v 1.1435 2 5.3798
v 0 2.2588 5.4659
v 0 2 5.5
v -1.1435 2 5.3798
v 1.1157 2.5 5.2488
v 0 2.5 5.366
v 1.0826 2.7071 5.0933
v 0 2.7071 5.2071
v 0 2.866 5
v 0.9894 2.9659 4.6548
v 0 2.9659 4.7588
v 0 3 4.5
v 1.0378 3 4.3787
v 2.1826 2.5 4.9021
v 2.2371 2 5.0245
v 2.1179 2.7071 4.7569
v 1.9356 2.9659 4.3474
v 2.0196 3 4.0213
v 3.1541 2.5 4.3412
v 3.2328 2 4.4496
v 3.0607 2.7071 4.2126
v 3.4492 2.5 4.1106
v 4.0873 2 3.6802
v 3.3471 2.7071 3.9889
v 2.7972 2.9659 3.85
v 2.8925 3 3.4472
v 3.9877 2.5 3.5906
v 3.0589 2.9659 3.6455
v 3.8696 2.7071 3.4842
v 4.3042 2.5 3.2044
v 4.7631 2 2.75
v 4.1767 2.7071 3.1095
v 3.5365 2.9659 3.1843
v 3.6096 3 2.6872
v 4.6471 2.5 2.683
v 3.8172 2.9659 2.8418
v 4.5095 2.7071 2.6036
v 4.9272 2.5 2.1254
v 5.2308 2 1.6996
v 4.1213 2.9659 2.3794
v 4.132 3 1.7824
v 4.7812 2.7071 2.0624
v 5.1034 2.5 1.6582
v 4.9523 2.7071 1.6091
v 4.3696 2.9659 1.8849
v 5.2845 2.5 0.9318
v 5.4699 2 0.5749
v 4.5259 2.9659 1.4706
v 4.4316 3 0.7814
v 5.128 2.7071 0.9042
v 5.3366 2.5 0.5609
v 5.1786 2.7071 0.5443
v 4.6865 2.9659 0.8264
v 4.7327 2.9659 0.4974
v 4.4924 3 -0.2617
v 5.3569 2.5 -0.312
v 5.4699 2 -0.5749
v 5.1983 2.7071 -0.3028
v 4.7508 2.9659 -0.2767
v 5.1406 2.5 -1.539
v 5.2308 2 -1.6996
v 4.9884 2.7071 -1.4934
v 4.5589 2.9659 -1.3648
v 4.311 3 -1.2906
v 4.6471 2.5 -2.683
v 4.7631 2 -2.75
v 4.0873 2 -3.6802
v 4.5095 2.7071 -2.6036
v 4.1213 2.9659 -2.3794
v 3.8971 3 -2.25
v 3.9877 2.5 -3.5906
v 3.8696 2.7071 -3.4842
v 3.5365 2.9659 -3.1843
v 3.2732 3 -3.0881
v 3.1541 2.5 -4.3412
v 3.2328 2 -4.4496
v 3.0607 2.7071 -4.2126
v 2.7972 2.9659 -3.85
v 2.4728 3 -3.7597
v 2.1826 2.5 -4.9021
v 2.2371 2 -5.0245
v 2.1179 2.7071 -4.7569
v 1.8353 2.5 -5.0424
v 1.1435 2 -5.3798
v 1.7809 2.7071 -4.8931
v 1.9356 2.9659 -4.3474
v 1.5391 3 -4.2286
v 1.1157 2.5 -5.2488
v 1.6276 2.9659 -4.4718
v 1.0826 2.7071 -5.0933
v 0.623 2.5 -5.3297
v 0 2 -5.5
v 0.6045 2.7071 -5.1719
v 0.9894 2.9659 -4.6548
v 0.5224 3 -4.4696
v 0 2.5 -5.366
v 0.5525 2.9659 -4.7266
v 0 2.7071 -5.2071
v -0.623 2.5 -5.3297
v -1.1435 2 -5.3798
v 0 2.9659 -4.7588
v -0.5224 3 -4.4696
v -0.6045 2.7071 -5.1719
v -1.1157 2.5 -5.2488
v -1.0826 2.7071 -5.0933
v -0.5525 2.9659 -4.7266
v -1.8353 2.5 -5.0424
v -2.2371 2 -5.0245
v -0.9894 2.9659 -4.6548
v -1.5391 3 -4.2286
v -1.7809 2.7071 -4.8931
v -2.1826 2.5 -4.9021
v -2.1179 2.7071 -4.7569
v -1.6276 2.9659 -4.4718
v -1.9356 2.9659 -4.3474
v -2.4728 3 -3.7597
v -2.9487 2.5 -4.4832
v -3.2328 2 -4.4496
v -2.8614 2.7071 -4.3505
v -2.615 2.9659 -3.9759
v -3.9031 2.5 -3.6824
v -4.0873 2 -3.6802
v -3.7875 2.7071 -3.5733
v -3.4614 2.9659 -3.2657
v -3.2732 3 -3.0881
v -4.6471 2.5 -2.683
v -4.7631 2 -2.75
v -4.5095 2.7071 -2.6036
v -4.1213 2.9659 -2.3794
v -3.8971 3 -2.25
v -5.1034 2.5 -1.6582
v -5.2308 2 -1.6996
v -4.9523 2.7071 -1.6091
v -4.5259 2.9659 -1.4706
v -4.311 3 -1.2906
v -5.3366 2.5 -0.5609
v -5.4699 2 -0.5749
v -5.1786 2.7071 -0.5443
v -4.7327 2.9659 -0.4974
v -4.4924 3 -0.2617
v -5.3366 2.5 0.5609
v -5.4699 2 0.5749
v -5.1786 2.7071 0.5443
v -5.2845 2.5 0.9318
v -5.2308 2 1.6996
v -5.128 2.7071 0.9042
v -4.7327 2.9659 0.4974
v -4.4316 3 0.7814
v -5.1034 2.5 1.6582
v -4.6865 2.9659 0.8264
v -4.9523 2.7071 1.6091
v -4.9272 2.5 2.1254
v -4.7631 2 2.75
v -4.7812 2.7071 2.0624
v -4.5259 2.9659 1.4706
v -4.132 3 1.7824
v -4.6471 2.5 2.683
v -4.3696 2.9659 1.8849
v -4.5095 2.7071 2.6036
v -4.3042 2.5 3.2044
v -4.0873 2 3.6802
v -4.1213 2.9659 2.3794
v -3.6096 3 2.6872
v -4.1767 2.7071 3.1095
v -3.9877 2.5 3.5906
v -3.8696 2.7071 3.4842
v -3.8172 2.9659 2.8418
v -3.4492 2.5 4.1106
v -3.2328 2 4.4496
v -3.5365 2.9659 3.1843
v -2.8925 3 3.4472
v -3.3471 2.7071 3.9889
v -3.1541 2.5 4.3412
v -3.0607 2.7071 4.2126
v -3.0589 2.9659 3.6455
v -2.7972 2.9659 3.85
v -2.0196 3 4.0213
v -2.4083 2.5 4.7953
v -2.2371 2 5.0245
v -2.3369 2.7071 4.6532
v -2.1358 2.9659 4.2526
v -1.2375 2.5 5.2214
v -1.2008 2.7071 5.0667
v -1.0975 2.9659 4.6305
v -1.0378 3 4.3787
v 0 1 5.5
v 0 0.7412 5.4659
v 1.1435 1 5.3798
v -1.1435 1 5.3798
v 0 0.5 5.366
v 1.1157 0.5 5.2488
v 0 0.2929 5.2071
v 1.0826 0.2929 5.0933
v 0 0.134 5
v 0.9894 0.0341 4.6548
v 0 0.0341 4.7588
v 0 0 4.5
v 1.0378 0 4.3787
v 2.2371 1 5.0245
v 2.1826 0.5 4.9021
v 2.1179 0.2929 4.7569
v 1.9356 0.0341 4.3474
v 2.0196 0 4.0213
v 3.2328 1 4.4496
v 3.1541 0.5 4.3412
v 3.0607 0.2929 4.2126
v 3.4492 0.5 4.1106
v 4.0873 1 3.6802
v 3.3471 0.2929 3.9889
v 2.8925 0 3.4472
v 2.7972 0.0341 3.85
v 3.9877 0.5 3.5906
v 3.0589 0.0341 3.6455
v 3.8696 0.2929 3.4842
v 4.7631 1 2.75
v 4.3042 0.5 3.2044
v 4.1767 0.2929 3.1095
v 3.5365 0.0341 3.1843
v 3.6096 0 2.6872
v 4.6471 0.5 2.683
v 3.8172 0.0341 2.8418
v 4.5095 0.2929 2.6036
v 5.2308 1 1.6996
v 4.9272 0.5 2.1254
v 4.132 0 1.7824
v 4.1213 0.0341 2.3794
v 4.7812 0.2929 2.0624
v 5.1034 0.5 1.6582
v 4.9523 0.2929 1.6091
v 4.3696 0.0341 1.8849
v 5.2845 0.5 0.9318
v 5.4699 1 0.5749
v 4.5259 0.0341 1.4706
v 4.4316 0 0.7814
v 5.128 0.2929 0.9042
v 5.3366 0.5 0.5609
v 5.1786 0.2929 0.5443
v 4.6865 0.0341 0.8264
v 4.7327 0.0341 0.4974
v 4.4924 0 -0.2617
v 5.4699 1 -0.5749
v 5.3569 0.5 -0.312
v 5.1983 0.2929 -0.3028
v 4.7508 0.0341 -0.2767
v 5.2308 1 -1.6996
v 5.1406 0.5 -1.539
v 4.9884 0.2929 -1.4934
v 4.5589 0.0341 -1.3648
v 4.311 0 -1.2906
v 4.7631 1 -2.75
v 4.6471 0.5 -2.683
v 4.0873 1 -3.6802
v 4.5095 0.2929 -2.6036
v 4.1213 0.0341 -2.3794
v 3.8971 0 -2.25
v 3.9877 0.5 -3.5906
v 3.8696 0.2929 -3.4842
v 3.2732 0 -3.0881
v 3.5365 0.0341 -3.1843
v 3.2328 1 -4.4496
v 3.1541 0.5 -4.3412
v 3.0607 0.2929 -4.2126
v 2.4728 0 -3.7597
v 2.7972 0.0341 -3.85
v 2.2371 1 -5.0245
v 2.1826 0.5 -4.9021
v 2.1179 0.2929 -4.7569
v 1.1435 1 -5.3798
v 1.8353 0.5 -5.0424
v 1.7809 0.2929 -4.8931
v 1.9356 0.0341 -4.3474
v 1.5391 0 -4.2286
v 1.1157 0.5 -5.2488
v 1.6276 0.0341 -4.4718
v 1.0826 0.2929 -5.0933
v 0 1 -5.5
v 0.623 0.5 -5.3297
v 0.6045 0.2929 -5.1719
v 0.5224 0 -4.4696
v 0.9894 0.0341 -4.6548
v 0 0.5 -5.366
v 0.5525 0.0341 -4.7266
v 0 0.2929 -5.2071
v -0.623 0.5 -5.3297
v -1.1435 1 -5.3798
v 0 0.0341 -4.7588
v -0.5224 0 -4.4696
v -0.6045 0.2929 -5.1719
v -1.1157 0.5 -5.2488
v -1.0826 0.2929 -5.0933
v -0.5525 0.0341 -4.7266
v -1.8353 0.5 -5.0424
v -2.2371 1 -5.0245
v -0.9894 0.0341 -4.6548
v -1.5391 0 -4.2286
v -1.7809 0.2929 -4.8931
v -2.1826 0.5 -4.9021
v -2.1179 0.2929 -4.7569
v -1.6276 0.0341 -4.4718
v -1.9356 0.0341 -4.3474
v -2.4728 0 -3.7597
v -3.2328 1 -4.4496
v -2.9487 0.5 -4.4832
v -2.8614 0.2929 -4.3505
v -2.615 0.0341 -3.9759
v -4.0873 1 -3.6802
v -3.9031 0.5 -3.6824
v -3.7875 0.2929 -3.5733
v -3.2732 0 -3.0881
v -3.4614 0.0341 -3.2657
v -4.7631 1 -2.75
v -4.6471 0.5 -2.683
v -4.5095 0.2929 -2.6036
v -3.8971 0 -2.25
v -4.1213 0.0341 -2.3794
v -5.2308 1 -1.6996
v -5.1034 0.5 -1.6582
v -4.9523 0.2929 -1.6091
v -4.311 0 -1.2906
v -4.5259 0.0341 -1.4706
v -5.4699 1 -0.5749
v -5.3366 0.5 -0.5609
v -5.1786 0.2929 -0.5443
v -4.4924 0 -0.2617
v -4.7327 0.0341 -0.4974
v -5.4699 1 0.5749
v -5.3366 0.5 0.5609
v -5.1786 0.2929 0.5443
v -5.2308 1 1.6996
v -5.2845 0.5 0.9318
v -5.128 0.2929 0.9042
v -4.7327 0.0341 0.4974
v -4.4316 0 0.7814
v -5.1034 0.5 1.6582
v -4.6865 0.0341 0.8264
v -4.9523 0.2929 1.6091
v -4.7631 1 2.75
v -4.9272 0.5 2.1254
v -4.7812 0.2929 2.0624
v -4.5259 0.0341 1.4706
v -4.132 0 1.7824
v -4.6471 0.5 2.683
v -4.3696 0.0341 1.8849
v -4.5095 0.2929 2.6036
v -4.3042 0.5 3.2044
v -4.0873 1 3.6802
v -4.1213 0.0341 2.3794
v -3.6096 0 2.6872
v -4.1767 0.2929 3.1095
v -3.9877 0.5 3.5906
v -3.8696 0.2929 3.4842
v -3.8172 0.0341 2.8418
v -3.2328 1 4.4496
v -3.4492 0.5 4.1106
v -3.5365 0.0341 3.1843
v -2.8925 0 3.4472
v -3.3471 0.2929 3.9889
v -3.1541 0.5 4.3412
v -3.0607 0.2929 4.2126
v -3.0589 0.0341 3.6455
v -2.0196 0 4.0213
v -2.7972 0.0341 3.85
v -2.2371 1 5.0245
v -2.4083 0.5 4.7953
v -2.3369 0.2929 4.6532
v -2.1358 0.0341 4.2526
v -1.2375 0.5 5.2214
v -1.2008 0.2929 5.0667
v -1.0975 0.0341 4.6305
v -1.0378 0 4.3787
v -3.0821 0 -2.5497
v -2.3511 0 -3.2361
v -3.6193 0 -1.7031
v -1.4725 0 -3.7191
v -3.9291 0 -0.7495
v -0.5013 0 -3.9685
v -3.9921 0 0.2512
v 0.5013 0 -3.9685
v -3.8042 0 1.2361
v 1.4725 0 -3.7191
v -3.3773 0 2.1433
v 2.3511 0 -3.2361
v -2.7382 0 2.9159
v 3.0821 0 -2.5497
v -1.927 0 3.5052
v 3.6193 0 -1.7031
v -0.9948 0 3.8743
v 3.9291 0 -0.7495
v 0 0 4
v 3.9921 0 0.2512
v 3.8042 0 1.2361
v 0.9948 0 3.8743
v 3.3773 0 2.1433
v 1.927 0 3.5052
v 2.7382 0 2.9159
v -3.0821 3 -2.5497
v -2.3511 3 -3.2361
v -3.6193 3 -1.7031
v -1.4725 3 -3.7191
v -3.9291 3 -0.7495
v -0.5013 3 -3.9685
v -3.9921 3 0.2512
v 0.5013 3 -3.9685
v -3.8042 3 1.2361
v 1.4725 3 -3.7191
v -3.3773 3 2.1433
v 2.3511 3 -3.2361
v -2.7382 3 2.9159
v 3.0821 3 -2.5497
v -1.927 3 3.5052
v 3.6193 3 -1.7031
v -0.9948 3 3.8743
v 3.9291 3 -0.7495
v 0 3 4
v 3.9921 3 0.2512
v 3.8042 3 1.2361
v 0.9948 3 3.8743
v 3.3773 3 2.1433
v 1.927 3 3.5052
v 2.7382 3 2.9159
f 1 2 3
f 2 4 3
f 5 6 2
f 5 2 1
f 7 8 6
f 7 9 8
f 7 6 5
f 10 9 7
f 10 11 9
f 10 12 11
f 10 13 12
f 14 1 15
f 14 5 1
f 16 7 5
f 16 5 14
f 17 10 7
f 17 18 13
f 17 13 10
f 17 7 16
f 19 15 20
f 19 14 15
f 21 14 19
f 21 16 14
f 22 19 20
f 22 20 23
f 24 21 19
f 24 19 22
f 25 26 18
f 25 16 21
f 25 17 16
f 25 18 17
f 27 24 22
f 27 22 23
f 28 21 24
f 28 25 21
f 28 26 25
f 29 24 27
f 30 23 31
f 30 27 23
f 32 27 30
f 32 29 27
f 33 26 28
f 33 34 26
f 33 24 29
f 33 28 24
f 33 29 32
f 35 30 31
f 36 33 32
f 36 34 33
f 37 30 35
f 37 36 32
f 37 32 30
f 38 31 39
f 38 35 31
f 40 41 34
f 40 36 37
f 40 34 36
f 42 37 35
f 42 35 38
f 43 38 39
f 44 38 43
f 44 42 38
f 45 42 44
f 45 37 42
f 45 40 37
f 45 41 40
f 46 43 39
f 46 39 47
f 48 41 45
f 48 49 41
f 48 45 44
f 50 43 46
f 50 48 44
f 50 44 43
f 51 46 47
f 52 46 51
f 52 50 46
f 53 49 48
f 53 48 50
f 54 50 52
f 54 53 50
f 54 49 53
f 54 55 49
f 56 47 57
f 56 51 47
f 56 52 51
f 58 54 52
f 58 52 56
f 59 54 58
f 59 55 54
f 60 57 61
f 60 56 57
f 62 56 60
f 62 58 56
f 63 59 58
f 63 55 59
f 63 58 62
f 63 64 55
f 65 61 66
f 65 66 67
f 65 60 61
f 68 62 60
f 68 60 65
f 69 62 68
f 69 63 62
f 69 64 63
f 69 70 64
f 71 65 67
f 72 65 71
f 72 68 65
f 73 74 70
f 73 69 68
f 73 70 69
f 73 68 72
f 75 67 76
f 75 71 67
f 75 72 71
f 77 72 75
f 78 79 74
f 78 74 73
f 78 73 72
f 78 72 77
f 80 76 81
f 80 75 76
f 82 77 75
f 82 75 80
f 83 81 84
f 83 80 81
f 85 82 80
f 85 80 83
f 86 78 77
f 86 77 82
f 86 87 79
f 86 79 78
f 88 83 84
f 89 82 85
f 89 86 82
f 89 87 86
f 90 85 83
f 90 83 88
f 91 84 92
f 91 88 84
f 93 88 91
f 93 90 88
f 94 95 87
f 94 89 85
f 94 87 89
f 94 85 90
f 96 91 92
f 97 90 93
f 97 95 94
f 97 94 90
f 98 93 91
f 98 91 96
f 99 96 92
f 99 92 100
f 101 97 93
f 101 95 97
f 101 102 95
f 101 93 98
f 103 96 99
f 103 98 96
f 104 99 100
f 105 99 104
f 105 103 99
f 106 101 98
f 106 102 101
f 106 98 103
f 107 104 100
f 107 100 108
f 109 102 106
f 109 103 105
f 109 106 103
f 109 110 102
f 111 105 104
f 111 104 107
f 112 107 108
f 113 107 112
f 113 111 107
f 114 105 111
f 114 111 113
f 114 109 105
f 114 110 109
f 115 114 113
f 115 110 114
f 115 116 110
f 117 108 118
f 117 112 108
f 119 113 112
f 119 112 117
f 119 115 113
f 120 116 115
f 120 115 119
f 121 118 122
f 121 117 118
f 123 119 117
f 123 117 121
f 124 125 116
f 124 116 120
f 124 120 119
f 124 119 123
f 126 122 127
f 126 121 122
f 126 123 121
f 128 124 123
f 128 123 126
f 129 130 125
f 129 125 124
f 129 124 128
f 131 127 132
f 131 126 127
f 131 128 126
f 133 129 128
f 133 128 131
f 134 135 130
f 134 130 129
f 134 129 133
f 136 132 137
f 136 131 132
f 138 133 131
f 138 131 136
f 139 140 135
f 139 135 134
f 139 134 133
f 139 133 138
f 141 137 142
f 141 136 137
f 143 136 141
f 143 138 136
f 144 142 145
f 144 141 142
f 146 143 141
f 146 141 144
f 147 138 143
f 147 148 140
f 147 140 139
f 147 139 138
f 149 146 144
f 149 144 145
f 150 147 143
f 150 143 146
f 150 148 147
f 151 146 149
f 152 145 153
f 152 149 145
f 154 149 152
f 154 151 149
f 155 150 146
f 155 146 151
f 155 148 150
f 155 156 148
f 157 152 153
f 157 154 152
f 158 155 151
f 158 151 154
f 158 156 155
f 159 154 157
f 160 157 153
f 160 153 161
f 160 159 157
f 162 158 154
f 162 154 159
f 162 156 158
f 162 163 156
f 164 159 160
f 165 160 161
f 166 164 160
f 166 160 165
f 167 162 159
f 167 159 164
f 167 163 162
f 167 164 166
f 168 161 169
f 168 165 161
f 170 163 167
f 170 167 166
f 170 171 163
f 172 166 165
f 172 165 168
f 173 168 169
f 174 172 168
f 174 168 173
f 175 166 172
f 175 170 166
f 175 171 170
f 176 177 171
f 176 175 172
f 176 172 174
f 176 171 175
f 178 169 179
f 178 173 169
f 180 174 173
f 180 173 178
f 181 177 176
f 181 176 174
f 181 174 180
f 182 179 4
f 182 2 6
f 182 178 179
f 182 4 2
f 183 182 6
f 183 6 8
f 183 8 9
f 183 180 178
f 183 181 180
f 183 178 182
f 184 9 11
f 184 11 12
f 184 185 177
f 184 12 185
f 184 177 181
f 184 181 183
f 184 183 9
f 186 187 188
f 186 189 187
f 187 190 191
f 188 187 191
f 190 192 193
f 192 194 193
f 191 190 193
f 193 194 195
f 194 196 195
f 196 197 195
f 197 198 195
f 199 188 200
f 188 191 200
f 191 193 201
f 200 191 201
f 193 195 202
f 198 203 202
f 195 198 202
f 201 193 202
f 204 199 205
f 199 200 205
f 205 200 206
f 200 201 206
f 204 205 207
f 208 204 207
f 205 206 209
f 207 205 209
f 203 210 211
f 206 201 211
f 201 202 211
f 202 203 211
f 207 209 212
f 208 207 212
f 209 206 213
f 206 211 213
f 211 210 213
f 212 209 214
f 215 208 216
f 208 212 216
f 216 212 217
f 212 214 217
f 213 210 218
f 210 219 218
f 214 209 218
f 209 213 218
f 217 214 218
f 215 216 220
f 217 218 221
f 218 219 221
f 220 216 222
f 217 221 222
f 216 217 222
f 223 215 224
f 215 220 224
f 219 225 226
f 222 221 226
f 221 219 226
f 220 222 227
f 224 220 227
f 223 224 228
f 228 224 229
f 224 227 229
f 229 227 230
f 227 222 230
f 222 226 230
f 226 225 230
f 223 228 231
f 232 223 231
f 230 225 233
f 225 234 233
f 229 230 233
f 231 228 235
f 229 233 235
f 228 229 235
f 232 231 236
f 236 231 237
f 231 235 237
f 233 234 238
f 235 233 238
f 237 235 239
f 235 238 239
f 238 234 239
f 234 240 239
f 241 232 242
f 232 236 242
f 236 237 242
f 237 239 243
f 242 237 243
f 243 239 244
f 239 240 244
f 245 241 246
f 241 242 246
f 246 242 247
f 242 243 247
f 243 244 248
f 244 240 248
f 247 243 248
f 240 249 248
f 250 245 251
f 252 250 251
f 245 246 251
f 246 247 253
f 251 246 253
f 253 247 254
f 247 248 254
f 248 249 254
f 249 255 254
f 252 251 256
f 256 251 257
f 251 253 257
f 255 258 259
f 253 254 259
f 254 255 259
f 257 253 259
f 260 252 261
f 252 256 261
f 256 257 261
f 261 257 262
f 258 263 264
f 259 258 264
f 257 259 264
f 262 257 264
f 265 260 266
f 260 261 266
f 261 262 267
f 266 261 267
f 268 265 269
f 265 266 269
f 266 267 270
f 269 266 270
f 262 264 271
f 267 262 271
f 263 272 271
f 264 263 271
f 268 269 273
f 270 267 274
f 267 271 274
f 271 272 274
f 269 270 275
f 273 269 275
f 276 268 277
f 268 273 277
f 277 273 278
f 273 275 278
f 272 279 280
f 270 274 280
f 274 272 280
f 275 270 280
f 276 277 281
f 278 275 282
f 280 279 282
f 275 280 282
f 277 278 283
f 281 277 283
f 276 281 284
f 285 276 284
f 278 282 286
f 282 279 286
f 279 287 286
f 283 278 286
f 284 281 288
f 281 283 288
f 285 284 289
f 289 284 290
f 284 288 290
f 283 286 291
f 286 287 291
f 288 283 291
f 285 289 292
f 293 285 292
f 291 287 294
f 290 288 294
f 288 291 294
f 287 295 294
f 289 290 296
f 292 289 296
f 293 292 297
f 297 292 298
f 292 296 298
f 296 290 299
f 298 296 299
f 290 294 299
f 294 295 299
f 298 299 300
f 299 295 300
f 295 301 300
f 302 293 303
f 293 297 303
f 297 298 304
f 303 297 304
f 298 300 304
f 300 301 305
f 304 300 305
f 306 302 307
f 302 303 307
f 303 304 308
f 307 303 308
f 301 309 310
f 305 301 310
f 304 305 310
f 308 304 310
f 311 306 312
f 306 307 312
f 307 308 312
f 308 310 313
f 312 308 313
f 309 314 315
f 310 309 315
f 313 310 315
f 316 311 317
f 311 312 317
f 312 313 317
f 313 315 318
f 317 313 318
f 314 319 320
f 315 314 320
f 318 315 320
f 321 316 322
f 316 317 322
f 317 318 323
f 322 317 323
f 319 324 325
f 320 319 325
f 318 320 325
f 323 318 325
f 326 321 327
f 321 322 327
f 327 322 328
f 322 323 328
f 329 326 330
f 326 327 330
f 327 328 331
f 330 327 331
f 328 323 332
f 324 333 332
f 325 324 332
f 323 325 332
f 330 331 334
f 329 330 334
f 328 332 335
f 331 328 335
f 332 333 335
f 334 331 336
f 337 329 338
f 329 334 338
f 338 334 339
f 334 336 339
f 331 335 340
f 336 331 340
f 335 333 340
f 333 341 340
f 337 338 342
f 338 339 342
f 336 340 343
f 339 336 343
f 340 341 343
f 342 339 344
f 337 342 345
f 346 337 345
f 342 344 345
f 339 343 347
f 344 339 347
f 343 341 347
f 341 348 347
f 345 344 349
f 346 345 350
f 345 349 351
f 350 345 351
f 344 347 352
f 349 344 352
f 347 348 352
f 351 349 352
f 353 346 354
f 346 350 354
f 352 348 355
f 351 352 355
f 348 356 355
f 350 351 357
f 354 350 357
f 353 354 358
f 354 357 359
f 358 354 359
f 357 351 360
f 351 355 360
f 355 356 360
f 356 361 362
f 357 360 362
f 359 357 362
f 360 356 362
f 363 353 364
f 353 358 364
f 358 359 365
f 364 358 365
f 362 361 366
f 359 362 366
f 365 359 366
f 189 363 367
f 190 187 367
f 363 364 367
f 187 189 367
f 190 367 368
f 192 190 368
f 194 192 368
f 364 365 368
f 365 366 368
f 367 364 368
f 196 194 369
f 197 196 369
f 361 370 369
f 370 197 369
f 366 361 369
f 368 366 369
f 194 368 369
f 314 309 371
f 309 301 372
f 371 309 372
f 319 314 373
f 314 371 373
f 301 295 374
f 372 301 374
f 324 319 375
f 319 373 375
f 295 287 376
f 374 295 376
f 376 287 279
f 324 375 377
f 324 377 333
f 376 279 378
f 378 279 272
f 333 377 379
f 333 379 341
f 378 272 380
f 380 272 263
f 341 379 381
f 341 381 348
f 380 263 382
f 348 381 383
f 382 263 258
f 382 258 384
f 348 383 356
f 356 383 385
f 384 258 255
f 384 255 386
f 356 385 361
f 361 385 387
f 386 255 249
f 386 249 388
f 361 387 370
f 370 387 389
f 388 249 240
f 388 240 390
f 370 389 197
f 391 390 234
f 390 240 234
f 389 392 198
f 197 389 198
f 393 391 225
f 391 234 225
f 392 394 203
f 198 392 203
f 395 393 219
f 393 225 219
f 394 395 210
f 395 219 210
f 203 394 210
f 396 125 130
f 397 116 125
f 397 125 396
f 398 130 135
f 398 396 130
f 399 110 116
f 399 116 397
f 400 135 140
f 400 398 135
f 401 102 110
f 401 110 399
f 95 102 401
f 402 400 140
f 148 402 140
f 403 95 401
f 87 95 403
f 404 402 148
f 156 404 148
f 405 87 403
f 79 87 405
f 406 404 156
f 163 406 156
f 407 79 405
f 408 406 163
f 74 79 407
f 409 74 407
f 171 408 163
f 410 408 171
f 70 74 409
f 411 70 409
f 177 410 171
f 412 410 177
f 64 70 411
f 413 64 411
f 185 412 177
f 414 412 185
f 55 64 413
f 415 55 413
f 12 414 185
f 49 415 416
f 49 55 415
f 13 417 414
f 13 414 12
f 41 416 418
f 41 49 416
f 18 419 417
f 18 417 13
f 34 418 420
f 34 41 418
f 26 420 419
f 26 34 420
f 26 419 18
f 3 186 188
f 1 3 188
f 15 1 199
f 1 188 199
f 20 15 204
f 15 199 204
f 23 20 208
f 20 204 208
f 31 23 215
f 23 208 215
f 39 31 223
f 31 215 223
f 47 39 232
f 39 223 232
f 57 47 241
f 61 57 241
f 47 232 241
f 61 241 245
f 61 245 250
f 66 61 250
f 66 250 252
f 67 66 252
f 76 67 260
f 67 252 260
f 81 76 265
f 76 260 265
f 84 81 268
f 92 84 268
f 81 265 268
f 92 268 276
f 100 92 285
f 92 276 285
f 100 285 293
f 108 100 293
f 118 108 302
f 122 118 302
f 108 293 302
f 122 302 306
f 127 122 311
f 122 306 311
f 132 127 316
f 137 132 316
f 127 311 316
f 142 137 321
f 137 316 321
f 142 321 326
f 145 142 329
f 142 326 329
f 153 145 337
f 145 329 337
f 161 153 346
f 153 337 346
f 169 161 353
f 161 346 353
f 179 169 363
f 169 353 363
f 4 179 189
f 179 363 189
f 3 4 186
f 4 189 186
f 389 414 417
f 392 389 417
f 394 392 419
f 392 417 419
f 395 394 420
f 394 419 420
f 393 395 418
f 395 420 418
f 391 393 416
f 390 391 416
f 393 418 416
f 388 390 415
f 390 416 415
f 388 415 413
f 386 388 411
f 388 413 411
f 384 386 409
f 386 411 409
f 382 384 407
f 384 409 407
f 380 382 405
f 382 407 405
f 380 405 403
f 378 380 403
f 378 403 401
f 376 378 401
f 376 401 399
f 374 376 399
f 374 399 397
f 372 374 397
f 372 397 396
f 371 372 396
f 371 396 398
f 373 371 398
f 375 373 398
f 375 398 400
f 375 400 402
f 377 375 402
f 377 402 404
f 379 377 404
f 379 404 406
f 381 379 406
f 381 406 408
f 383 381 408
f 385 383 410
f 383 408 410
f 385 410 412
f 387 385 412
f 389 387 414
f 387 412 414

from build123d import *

# Parameters (mm, degrees)
CROQUIS1_R              = 5.5
SALIENTE_EXTRUIR1_DEPTH = 3
CROQUIS2_R              = 4
CORTAR_EXTRUIR1_DEPTH   = 5
REDONDEO1_R             = 1
REDONDEO2_R             = 1


with BuildPart() as part:
    # Croquis1 → Saliente-Extruir1 (new body)
    with BuildSketch(Plane(origin=(0, 0, 0), x_dir=(1, 0, 0), z_dir=(0, 1, 0))):
        with Locations(Location((0, 0, 0), (0, 0, 270))):
            Circle(CROQUIS1_R)
    extrude(amount=SALIENTE_EXTRUIR1_DEPTH)

    # Croquis2 → Cortar-Extruir1 (cut)
    with BuildSketch(Plane(origin=(0, 3, 0), x_dir=(1, 0, 0), z_dir=(0, 1, 0))):
        with Locations(Location((0, 0, 0), (0, 0, 270))):
            Circle(CROQUIS2_R)
    extrude(amount=-CORTAR_EXTRUIR1_DEPTH, mode=Mode.SUBTRACT)

    # Redondeo1
    redondeo1_edges = [part.edges().sort_by_distance(p)[0] for p in [
        (0, 3, -5.5),
    ]]
    fillet(redondeo1_edges, radius=REDONDEO1_R)

    # Redondeo2
    redondeo2_edges = [part.edges().sort_by_distance(p)[0] for p in [
        (0, 0, -5.5),
    ]]
    fillet(redondeo2_edges, radius=REDONDEO2_R)


solid = part.part
